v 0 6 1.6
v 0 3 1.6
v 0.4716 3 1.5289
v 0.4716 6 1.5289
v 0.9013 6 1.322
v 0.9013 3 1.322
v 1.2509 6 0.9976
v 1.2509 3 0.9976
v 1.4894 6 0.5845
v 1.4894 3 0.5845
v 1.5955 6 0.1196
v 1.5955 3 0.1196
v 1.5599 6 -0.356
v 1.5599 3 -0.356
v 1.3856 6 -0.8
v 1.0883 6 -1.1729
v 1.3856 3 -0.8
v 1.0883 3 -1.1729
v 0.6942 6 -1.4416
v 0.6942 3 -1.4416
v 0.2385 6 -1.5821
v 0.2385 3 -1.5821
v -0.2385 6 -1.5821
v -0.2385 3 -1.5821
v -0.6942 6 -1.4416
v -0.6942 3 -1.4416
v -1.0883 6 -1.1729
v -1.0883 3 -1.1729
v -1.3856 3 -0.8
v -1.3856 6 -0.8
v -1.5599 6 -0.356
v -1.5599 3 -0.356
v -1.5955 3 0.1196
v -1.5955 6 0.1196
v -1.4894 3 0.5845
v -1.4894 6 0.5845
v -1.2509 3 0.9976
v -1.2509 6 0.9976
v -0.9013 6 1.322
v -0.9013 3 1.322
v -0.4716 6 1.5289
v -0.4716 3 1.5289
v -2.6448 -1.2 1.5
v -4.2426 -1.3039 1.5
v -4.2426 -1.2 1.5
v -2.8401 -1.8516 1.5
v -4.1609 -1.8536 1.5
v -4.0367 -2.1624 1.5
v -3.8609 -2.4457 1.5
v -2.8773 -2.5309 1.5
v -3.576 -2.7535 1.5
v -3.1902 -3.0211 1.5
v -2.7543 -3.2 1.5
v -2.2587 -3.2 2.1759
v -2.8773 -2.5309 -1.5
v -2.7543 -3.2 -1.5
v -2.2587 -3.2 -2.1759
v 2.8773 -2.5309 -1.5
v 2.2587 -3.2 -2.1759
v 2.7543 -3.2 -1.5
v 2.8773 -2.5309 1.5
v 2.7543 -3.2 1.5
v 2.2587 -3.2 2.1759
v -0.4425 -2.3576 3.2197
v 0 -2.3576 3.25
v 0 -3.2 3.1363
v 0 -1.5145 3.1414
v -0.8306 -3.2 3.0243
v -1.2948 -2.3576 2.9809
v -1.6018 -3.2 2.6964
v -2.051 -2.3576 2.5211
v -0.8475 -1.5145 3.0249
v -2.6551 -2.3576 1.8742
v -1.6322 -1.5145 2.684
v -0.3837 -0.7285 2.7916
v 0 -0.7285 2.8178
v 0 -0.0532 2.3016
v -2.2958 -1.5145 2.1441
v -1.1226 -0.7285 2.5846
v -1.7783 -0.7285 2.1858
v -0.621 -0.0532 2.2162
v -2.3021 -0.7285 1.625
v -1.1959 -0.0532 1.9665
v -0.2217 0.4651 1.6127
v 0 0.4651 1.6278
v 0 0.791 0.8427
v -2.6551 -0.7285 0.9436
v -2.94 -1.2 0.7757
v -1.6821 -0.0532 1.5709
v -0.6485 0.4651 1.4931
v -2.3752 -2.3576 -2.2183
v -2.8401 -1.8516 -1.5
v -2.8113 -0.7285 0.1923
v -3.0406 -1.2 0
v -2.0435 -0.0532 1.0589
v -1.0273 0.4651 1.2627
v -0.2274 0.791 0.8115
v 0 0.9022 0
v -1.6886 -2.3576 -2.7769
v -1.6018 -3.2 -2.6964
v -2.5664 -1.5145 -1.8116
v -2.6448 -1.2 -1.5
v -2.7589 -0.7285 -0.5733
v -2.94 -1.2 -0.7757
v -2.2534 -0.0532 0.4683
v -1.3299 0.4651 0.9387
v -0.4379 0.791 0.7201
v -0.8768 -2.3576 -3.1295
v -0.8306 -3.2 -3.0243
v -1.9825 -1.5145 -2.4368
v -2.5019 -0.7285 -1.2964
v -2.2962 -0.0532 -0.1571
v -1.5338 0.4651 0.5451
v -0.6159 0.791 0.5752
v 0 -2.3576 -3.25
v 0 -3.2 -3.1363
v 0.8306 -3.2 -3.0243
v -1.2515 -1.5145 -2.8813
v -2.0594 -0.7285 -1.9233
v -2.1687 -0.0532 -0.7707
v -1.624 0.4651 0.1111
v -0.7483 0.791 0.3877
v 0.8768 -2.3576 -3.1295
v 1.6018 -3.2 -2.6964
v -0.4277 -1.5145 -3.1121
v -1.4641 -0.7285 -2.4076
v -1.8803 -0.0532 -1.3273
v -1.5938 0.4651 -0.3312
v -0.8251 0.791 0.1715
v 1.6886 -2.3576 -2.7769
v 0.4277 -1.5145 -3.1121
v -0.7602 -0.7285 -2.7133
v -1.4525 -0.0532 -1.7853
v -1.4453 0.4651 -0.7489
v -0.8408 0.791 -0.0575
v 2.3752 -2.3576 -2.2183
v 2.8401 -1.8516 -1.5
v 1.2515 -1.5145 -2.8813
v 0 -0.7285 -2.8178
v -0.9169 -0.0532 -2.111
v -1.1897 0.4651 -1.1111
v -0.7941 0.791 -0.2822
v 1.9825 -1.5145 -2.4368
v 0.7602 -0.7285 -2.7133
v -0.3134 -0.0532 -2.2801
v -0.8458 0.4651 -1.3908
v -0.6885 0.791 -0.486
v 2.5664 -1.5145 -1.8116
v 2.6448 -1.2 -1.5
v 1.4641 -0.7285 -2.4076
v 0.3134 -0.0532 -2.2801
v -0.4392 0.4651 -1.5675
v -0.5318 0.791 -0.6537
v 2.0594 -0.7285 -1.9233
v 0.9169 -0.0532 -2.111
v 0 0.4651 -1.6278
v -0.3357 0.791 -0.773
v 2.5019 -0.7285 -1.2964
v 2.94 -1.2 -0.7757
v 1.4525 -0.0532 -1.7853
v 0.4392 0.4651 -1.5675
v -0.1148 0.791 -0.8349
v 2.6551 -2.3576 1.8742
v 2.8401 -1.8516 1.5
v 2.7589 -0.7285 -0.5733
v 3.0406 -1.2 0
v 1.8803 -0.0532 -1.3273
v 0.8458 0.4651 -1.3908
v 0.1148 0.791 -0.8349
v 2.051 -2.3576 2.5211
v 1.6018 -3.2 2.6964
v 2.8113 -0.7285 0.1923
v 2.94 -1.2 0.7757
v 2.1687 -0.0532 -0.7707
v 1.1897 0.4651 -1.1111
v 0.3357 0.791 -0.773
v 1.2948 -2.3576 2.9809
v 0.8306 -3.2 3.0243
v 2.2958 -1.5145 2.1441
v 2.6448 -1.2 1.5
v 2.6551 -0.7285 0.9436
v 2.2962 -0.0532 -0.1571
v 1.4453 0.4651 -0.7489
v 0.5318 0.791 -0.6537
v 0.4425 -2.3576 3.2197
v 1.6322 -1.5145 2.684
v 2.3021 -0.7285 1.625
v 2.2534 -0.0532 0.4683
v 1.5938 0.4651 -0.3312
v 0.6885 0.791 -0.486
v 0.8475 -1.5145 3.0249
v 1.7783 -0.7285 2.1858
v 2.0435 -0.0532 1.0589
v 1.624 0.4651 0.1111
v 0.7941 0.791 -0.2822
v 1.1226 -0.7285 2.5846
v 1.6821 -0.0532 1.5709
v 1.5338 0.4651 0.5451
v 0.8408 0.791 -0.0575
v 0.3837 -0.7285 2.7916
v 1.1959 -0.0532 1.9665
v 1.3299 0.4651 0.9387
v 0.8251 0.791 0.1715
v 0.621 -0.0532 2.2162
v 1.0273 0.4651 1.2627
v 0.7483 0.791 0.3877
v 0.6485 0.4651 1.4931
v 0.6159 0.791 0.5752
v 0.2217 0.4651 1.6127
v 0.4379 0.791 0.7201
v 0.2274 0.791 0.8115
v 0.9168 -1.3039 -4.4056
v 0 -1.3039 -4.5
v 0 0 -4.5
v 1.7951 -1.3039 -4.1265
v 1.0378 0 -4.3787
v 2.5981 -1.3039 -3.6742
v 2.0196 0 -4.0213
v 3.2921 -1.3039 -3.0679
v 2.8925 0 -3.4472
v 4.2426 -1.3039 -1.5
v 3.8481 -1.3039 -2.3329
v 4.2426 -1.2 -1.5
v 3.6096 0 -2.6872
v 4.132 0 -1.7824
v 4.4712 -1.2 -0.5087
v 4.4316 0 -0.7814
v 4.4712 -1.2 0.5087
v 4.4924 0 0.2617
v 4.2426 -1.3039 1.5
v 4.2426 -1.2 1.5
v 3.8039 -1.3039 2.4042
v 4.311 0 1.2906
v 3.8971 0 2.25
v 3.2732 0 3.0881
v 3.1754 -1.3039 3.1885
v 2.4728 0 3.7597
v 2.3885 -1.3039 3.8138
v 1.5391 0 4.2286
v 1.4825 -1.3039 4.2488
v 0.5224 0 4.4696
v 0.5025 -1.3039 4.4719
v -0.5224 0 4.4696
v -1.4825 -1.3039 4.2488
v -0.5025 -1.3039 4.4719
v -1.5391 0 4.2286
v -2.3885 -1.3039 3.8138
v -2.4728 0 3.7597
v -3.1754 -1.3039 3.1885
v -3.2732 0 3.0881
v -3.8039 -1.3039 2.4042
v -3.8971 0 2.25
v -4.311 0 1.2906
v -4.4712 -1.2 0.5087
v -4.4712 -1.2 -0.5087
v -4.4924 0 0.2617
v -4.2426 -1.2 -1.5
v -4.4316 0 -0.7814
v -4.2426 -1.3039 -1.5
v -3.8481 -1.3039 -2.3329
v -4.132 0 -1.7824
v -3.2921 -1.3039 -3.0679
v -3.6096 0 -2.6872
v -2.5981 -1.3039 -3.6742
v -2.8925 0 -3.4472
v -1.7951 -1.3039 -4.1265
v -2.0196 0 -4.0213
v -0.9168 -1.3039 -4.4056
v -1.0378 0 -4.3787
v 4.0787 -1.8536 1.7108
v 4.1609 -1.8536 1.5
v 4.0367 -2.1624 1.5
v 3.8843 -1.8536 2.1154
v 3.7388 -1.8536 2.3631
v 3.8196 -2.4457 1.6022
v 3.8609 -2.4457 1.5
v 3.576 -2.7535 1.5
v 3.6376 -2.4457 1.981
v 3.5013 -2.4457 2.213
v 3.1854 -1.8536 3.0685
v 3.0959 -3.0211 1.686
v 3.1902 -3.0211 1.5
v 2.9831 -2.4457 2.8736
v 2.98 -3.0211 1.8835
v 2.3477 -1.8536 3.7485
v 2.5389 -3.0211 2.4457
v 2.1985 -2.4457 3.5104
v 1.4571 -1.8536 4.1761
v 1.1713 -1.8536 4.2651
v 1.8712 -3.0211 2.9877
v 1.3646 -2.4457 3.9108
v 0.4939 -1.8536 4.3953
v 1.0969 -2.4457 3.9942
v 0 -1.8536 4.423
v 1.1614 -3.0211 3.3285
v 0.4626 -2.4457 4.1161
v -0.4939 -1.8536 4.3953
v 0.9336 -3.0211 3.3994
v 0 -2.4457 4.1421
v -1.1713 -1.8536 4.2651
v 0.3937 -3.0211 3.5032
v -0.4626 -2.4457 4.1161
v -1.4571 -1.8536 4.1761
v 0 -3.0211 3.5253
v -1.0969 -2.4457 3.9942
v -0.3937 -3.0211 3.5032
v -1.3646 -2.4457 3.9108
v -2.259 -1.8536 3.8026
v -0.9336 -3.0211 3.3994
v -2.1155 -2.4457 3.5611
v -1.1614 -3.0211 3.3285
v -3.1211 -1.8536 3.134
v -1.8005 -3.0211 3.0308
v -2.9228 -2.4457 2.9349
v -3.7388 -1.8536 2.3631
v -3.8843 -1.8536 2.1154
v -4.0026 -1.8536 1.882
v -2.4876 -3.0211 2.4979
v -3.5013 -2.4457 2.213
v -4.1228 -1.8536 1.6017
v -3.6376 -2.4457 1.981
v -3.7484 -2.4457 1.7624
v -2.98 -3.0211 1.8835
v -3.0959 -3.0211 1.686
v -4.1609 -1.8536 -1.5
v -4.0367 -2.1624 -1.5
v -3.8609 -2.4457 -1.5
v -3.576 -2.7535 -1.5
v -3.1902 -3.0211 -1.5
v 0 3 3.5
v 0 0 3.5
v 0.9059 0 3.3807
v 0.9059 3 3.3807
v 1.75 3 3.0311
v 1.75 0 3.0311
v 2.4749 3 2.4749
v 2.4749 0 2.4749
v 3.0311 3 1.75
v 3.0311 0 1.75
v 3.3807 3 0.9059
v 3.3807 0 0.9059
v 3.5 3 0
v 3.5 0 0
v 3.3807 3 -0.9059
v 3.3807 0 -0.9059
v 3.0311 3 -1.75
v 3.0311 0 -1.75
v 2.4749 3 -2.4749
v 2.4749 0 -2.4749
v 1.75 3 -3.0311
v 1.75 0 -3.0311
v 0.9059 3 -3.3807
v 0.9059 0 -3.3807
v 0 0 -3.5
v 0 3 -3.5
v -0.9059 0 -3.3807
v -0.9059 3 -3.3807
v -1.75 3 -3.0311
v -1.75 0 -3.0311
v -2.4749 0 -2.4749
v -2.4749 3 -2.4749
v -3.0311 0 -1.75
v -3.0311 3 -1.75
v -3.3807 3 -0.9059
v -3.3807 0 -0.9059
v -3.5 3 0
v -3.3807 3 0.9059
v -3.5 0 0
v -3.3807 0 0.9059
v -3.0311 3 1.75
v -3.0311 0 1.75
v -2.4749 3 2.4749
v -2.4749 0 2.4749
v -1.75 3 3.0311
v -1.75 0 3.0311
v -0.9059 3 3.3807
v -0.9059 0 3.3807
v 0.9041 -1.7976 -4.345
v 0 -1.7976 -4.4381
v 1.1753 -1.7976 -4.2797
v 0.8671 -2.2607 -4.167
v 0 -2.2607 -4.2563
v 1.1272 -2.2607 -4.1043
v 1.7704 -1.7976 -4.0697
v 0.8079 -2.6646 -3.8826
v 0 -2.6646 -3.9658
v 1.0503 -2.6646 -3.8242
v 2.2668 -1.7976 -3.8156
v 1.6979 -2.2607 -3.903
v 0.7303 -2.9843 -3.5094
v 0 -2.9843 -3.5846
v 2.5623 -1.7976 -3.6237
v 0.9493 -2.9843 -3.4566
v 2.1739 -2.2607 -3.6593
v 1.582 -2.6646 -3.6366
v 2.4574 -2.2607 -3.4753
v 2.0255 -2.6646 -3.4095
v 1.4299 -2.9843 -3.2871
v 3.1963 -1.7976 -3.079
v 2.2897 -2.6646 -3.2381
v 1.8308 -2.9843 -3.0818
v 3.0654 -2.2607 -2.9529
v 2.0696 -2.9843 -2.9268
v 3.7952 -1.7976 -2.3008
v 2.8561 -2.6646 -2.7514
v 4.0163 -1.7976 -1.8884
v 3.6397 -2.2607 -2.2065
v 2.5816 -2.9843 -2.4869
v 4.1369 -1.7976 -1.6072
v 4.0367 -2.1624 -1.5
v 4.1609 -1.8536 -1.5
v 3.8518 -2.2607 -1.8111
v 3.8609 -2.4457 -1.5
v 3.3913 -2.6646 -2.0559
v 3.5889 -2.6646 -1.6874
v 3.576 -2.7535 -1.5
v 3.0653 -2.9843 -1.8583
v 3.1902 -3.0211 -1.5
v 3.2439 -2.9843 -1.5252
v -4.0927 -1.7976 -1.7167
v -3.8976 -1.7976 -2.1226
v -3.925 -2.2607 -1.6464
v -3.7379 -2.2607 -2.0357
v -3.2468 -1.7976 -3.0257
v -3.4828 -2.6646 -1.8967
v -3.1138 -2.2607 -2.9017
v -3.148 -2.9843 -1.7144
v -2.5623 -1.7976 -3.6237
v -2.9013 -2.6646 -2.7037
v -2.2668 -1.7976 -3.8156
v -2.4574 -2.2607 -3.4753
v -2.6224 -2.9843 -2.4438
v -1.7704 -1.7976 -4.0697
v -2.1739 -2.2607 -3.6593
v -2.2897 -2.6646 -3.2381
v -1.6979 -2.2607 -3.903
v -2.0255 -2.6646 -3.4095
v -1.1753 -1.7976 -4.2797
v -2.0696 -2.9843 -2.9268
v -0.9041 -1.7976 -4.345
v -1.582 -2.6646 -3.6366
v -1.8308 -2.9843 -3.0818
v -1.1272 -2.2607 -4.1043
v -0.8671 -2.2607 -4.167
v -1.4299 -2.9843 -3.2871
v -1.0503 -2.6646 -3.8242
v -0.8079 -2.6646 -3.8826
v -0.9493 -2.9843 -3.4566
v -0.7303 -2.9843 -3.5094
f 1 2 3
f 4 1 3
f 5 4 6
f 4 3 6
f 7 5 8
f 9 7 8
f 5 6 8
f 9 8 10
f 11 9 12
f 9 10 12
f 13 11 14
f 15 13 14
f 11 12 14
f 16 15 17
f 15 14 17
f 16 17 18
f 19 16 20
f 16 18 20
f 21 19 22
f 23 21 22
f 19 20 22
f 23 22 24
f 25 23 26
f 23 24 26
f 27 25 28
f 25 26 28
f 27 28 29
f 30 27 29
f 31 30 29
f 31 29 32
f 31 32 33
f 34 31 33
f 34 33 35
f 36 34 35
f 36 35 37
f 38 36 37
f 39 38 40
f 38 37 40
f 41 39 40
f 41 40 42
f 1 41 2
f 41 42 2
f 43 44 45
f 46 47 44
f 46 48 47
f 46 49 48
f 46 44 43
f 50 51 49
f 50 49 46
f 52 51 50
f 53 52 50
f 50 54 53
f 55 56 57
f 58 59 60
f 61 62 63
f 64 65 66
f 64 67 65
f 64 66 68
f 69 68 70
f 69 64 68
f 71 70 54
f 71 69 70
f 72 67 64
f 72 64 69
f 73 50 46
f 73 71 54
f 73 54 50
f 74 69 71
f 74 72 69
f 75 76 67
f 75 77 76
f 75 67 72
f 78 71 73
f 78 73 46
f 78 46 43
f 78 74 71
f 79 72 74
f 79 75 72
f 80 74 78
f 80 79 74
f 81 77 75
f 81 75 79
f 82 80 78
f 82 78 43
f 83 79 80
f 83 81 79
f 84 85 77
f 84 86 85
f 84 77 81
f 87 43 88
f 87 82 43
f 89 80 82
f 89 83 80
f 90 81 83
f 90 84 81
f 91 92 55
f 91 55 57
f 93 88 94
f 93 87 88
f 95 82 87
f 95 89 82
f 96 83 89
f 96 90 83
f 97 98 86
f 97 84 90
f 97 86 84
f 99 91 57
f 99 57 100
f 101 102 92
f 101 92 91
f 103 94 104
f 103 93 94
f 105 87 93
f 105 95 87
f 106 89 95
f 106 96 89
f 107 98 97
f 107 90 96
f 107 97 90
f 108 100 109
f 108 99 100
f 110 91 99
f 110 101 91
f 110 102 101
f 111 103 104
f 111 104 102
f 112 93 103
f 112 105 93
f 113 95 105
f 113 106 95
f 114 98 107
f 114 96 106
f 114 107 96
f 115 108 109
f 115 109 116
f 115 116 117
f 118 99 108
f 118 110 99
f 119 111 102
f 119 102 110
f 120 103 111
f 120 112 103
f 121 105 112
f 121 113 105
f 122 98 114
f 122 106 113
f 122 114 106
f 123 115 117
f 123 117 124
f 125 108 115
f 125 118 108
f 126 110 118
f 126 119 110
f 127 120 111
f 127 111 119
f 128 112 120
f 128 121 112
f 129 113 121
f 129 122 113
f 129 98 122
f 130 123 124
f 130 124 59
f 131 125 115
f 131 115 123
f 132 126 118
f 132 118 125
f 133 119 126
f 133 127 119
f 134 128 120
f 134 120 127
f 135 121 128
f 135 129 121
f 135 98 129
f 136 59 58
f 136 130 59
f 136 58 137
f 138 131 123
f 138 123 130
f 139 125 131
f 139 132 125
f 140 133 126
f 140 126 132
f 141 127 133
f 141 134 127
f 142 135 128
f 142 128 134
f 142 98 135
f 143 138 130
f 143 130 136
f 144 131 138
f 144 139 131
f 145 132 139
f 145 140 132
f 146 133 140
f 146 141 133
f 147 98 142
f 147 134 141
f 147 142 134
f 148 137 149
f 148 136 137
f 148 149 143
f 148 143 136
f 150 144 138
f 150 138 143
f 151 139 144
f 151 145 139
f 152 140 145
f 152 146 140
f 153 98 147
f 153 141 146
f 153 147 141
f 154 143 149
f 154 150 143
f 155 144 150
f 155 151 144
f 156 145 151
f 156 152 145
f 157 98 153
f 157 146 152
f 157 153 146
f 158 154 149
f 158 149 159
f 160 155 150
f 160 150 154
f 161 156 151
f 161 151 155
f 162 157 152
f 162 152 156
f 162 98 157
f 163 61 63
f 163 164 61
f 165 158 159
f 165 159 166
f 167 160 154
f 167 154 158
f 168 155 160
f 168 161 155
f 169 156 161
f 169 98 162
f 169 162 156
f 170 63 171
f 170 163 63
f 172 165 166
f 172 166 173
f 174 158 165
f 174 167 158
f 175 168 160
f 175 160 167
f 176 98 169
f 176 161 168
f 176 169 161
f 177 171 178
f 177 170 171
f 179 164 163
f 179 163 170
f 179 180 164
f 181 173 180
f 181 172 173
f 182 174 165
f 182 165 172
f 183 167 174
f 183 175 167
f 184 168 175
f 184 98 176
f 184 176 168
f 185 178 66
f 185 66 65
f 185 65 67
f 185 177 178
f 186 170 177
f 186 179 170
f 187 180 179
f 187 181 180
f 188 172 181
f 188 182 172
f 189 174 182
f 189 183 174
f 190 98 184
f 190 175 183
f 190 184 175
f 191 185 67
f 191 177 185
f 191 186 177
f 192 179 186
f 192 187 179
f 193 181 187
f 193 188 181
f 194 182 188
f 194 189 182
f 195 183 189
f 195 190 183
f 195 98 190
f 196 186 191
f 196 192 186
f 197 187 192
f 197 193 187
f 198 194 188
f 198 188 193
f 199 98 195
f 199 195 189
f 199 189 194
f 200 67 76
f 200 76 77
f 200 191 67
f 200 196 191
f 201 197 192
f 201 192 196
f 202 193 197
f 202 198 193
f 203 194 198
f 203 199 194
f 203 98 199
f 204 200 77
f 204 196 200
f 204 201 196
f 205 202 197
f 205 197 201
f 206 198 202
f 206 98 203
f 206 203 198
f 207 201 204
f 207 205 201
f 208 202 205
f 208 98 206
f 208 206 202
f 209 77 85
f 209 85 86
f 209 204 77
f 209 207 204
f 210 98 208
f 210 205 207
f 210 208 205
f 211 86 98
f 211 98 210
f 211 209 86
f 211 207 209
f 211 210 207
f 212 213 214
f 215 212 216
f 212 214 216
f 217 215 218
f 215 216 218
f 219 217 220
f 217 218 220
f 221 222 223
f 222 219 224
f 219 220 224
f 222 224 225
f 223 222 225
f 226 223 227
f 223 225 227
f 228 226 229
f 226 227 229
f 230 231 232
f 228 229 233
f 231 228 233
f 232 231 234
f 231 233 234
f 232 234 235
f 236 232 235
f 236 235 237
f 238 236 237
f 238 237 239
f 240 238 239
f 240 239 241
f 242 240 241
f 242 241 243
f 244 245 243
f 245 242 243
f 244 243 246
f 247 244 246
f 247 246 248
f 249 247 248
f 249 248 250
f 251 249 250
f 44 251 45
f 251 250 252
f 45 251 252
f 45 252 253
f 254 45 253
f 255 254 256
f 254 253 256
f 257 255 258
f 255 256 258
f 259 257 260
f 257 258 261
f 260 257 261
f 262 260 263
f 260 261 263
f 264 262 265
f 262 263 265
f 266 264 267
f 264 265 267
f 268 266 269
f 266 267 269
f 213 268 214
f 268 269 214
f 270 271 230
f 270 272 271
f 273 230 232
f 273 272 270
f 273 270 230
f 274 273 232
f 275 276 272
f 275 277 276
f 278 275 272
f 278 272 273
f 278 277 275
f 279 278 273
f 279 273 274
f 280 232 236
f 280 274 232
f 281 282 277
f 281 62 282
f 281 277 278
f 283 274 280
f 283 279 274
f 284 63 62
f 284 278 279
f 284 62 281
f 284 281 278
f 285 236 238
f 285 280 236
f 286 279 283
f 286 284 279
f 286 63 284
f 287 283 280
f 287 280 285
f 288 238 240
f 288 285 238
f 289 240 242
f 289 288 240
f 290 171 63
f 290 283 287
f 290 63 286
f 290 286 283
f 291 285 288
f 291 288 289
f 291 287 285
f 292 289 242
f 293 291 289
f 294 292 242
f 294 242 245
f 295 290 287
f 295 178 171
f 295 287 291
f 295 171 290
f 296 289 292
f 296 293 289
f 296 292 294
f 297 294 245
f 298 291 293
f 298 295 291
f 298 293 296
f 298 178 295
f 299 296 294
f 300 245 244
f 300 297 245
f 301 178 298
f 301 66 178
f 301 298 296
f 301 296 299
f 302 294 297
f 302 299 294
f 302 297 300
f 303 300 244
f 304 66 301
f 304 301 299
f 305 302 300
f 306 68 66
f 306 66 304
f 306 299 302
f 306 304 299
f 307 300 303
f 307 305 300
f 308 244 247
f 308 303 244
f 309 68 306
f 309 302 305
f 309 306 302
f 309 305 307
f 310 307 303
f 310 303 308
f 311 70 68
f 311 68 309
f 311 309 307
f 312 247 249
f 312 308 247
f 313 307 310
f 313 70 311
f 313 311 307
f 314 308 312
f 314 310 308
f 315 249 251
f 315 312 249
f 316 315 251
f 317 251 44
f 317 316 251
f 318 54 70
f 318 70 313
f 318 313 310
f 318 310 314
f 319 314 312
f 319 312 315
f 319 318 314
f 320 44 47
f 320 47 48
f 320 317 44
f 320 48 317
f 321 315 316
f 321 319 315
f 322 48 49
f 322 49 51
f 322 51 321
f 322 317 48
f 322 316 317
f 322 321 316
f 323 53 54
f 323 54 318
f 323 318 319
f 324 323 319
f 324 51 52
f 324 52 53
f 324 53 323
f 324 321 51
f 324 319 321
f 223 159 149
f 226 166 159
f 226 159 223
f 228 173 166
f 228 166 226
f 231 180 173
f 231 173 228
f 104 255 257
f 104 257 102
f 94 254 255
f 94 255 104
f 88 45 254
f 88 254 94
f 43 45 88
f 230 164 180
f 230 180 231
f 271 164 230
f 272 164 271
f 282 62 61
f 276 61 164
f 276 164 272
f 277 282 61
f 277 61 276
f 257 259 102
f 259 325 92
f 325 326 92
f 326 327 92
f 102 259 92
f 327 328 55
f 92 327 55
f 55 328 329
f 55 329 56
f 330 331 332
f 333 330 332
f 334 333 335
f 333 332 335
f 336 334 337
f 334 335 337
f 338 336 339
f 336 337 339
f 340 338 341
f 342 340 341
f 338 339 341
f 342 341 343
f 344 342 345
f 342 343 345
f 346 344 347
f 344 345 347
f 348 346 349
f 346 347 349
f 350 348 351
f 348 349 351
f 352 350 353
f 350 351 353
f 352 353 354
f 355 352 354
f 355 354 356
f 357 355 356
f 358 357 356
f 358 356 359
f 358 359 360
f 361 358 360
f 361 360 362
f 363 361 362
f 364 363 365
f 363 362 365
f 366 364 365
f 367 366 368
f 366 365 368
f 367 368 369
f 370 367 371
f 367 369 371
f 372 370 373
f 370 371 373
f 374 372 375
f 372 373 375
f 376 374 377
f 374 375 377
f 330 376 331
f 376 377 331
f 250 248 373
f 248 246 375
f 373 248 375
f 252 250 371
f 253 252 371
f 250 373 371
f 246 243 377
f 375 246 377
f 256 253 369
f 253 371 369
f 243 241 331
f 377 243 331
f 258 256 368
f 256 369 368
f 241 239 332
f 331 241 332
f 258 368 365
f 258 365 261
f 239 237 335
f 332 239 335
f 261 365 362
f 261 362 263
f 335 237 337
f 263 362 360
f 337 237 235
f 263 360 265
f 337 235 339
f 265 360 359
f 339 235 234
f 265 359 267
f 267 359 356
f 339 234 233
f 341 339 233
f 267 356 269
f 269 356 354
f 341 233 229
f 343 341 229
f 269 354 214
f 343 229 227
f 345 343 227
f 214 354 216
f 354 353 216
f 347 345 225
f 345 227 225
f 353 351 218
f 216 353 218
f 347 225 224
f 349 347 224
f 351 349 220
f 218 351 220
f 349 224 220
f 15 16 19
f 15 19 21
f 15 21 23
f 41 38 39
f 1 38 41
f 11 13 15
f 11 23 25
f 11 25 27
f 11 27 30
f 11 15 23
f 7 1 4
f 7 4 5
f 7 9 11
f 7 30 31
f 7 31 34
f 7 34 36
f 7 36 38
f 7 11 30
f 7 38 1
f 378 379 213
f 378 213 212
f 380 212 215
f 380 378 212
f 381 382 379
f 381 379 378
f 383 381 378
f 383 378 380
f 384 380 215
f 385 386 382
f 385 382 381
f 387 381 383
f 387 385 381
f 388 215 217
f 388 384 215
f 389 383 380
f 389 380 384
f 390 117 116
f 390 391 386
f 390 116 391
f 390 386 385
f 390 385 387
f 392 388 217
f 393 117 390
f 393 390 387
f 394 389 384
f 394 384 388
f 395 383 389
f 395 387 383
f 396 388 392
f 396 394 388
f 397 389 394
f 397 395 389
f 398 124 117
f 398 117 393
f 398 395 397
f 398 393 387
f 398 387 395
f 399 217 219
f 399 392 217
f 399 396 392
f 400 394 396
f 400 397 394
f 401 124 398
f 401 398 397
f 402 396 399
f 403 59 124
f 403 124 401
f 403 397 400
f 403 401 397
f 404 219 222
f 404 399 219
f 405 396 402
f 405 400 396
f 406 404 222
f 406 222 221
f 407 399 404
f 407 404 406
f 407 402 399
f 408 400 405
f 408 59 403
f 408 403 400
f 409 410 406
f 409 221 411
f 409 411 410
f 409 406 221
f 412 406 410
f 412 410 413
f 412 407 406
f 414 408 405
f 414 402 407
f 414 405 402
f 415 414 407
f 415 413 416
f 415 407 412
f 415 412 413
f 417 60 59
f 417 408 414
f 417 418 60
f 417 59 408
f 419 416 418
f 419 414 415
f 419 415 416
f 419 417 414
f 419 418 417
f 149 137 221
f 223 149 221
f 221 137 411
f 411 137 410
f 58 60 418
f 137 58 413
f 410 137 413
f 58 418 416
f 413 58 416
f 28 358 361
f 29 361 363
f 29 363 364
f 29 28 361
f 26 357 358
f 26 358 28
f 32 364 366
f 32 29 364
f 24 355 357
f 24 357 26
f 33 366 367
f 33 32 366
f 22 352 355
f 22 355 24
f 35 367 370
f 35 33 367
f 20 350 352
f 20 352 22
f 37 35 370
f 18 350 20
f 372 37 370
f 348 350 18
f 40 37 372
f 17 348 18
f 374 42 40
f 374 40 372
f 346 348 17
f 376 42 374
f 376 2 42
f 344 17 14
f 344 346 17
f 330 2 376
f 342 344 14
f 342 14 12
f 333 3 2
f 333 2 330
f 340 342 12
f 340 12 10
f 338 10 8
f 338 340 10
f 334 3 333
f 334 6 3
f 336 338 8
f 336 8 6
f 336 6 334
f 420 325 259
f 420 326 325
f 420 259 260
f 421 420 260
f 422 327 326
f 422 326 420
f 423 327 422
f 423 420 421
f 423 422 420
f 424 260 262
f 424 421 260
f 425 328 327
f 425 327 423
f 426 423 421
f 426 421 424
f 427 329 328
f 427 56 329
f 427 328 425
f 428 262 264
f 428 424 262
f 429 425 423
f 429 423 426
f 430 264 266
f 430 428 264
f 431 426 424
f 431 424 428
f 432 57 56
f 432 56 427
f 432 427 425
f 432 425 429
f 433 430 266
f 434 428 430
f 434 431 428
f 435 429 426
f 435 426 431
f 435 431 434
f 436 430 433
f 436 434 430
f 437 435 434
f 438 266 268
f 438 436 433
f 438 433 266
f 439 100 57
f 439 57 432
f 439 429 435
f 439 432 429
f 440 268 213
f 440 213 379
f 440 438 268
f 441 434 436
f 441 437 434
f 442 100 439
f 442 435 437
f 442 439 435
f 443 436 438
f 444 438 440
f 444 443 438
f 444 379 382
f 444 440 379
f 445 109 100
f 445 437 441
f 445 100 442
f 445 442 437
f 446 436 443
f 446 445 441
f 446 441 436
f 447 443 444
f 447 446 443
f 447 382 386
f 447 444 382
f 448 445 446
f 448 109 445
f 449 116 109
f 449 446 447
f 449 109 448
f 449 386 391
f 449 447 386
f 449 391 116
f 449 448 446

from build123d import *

# Parameters (mm, degrees)
SKETCH1_R      = 3.5
BASE_DEPTH     = 3
SKETCH2_R      = 1.6
PEG_DEPTH      = 3
SKETCH5_R      = 4.5
HOLDER_DEPTH   = 3.2
SKETCH8_W      = 12
SKETCH8_H      = 3
CUT_SLOT_DEPTH = 2
FILLET1_R      = 2


with BuildPart() as part:
    # Sketch1 → base (new body)
    with BuildSketch(Plane(origin=(0, 0, 0), x_dir=(1, 0, 0), z_dir=(0, 1, 0))):
        with Locations(Location((0, 0, 0), (0, 0, 270))):
            Circle(SKETCH1_R)
    extrude(amount=BASE_DEPTH)

    # Sketch2 → peg (add)
    with BuildSketch(Plane(origin=(0, 3, 0), x_dir=(1, 0, 0), z_dir=(0, 1, 0))):
        with Locations(Location((0, 0, 0), (0, 0, 270))):
            Circle(SKETCH2_R)
    extrude(amount=PEG_DEPTH)

    # Sketch5 → holder (add)
    with BuildSketch(Plane.XZ):
        with Locations(Location((0, 0, 0), (0, 0, 270))):
            Circle(SKETCH5_R)
    extrude(amount=HOLDER_DEPTH)

    # Sketch6 → Cut-ball (revolve, cut)
    with BuildSketch(Plane(origin=(0, 0, 0), x_dir=(0, 0, -1), z_dir=(1, 0, 0))):
        with BuildLine():
            Line((0, 0.902192429), (0, -5.597807571))
            ThreePointArc((0, -5.597807571), (-3.25, -2.347807571), (0, 0.902192429))
        make_face()
    revolve(axis=Axis((0, 6, 0), (0, -1, 0)), mode=Mode.SUBTRACT)

    # Sketch8 → Cut-slot (cut)
    with BuildSketch(Plane.XZ.offset(3.2)):
        Rectangle(SKETCH8_W, SKETCH8_H)
    extrude(amount=-CUT_SLOT_DEPTH, mode=Mode.SUBTRACT)

    # Fillet1
    # the kernel refuses this fillet: 2 mm, written as the material it takes off along each edge
    with BuildSketch(Plane(origin=(0, -3.2, 0), x_dir=(0, 0, -1), z_dir=(-1, 0, 0))) as fillet1_piece_1:
        with BuildLine():
            CenterArc((2.5, -1.896086641), FILLET1_R, 0, 71.449446556)
            Line((3.136282523, 0), (3.149008174, 0.037921733))
            ThreePointArc((3.149008174, 0.037921733), (3.818141262, 0.04), (4.5, 0.04))
            Line((4.5, 0.04), (4.54, 0))
            Line((4.54, 0), (4.54, -1.896086641))
            Line((4.54, -1.896086641), (4.5, -1.896086641))
        make_face()
    revolve(axis=Axis((0, -3.2, 0), (0, -1, 0)), revolution_arc=130.897979083, mode=Mode.SUBTRACT)
    with BuildSketch(Plane(origin=(0, -3.2, 0), x_dir=(0.7553656278426528, 0, -0.6553035695567931), z_dir=(-0.6553035695567931, 0, -0.7553656278426528))) as fillet1_piece_2:
        with BuildLine():
            CenterArc((2.5, -1.896086641), FILLET1_R, 0, 71.449446556)
            Line((3.136282523, 0), (3.149008174, 0.037921733))
            ThreePointArc((3.149008174, 0.037921733), (3.818141262, 0.04), (4.5, 0.04))
            Line((4.5, 0.04), (4.54, 0))
            Line((4.54, 0), (4.54, -1.896086641))
            Line((4.54, -1.896086641), (4.5, -1.896086641))
        make_face()
    revolve(axis=Axis((0, -3.2, 0), (0, -1, 0)), revolution_arc=261.88534443, mode=Mode.SUBTRACT)
    with BuildSketch(Plane(origin=(0, -3.2, 0), x_dir=(-0.7558765624849457, 0, 0.6547141531125946), z_dir=(0.6547141531125946, 0, 0.7558765624849457))) as fillet1_piece_3:
        with BuildLine():
            CenterArc((2.5, -1.896086641), FILLET1_R, 0, 71.449446556)
            Line((3.136282523, 0), (3.149008174, 0.037921733))
            ThreePointArc((3.149008174, 0.037921733), (3.818141262, 0.04), (4.5, 0.04))
            Line((4.5, 0.04), (4.54, 0))
            Line((4.54, 0), (4.54, -1.896086641))
            Line((4.54, -1.896086641), (4.5, -1.896086641))
        make_face()
    revolve(axis=Axis((0, -3.2, 0), (0, -1, 0)), revolution_arc=130.897979083, mode=Mode.SUBTRACT)


solid = part.part
